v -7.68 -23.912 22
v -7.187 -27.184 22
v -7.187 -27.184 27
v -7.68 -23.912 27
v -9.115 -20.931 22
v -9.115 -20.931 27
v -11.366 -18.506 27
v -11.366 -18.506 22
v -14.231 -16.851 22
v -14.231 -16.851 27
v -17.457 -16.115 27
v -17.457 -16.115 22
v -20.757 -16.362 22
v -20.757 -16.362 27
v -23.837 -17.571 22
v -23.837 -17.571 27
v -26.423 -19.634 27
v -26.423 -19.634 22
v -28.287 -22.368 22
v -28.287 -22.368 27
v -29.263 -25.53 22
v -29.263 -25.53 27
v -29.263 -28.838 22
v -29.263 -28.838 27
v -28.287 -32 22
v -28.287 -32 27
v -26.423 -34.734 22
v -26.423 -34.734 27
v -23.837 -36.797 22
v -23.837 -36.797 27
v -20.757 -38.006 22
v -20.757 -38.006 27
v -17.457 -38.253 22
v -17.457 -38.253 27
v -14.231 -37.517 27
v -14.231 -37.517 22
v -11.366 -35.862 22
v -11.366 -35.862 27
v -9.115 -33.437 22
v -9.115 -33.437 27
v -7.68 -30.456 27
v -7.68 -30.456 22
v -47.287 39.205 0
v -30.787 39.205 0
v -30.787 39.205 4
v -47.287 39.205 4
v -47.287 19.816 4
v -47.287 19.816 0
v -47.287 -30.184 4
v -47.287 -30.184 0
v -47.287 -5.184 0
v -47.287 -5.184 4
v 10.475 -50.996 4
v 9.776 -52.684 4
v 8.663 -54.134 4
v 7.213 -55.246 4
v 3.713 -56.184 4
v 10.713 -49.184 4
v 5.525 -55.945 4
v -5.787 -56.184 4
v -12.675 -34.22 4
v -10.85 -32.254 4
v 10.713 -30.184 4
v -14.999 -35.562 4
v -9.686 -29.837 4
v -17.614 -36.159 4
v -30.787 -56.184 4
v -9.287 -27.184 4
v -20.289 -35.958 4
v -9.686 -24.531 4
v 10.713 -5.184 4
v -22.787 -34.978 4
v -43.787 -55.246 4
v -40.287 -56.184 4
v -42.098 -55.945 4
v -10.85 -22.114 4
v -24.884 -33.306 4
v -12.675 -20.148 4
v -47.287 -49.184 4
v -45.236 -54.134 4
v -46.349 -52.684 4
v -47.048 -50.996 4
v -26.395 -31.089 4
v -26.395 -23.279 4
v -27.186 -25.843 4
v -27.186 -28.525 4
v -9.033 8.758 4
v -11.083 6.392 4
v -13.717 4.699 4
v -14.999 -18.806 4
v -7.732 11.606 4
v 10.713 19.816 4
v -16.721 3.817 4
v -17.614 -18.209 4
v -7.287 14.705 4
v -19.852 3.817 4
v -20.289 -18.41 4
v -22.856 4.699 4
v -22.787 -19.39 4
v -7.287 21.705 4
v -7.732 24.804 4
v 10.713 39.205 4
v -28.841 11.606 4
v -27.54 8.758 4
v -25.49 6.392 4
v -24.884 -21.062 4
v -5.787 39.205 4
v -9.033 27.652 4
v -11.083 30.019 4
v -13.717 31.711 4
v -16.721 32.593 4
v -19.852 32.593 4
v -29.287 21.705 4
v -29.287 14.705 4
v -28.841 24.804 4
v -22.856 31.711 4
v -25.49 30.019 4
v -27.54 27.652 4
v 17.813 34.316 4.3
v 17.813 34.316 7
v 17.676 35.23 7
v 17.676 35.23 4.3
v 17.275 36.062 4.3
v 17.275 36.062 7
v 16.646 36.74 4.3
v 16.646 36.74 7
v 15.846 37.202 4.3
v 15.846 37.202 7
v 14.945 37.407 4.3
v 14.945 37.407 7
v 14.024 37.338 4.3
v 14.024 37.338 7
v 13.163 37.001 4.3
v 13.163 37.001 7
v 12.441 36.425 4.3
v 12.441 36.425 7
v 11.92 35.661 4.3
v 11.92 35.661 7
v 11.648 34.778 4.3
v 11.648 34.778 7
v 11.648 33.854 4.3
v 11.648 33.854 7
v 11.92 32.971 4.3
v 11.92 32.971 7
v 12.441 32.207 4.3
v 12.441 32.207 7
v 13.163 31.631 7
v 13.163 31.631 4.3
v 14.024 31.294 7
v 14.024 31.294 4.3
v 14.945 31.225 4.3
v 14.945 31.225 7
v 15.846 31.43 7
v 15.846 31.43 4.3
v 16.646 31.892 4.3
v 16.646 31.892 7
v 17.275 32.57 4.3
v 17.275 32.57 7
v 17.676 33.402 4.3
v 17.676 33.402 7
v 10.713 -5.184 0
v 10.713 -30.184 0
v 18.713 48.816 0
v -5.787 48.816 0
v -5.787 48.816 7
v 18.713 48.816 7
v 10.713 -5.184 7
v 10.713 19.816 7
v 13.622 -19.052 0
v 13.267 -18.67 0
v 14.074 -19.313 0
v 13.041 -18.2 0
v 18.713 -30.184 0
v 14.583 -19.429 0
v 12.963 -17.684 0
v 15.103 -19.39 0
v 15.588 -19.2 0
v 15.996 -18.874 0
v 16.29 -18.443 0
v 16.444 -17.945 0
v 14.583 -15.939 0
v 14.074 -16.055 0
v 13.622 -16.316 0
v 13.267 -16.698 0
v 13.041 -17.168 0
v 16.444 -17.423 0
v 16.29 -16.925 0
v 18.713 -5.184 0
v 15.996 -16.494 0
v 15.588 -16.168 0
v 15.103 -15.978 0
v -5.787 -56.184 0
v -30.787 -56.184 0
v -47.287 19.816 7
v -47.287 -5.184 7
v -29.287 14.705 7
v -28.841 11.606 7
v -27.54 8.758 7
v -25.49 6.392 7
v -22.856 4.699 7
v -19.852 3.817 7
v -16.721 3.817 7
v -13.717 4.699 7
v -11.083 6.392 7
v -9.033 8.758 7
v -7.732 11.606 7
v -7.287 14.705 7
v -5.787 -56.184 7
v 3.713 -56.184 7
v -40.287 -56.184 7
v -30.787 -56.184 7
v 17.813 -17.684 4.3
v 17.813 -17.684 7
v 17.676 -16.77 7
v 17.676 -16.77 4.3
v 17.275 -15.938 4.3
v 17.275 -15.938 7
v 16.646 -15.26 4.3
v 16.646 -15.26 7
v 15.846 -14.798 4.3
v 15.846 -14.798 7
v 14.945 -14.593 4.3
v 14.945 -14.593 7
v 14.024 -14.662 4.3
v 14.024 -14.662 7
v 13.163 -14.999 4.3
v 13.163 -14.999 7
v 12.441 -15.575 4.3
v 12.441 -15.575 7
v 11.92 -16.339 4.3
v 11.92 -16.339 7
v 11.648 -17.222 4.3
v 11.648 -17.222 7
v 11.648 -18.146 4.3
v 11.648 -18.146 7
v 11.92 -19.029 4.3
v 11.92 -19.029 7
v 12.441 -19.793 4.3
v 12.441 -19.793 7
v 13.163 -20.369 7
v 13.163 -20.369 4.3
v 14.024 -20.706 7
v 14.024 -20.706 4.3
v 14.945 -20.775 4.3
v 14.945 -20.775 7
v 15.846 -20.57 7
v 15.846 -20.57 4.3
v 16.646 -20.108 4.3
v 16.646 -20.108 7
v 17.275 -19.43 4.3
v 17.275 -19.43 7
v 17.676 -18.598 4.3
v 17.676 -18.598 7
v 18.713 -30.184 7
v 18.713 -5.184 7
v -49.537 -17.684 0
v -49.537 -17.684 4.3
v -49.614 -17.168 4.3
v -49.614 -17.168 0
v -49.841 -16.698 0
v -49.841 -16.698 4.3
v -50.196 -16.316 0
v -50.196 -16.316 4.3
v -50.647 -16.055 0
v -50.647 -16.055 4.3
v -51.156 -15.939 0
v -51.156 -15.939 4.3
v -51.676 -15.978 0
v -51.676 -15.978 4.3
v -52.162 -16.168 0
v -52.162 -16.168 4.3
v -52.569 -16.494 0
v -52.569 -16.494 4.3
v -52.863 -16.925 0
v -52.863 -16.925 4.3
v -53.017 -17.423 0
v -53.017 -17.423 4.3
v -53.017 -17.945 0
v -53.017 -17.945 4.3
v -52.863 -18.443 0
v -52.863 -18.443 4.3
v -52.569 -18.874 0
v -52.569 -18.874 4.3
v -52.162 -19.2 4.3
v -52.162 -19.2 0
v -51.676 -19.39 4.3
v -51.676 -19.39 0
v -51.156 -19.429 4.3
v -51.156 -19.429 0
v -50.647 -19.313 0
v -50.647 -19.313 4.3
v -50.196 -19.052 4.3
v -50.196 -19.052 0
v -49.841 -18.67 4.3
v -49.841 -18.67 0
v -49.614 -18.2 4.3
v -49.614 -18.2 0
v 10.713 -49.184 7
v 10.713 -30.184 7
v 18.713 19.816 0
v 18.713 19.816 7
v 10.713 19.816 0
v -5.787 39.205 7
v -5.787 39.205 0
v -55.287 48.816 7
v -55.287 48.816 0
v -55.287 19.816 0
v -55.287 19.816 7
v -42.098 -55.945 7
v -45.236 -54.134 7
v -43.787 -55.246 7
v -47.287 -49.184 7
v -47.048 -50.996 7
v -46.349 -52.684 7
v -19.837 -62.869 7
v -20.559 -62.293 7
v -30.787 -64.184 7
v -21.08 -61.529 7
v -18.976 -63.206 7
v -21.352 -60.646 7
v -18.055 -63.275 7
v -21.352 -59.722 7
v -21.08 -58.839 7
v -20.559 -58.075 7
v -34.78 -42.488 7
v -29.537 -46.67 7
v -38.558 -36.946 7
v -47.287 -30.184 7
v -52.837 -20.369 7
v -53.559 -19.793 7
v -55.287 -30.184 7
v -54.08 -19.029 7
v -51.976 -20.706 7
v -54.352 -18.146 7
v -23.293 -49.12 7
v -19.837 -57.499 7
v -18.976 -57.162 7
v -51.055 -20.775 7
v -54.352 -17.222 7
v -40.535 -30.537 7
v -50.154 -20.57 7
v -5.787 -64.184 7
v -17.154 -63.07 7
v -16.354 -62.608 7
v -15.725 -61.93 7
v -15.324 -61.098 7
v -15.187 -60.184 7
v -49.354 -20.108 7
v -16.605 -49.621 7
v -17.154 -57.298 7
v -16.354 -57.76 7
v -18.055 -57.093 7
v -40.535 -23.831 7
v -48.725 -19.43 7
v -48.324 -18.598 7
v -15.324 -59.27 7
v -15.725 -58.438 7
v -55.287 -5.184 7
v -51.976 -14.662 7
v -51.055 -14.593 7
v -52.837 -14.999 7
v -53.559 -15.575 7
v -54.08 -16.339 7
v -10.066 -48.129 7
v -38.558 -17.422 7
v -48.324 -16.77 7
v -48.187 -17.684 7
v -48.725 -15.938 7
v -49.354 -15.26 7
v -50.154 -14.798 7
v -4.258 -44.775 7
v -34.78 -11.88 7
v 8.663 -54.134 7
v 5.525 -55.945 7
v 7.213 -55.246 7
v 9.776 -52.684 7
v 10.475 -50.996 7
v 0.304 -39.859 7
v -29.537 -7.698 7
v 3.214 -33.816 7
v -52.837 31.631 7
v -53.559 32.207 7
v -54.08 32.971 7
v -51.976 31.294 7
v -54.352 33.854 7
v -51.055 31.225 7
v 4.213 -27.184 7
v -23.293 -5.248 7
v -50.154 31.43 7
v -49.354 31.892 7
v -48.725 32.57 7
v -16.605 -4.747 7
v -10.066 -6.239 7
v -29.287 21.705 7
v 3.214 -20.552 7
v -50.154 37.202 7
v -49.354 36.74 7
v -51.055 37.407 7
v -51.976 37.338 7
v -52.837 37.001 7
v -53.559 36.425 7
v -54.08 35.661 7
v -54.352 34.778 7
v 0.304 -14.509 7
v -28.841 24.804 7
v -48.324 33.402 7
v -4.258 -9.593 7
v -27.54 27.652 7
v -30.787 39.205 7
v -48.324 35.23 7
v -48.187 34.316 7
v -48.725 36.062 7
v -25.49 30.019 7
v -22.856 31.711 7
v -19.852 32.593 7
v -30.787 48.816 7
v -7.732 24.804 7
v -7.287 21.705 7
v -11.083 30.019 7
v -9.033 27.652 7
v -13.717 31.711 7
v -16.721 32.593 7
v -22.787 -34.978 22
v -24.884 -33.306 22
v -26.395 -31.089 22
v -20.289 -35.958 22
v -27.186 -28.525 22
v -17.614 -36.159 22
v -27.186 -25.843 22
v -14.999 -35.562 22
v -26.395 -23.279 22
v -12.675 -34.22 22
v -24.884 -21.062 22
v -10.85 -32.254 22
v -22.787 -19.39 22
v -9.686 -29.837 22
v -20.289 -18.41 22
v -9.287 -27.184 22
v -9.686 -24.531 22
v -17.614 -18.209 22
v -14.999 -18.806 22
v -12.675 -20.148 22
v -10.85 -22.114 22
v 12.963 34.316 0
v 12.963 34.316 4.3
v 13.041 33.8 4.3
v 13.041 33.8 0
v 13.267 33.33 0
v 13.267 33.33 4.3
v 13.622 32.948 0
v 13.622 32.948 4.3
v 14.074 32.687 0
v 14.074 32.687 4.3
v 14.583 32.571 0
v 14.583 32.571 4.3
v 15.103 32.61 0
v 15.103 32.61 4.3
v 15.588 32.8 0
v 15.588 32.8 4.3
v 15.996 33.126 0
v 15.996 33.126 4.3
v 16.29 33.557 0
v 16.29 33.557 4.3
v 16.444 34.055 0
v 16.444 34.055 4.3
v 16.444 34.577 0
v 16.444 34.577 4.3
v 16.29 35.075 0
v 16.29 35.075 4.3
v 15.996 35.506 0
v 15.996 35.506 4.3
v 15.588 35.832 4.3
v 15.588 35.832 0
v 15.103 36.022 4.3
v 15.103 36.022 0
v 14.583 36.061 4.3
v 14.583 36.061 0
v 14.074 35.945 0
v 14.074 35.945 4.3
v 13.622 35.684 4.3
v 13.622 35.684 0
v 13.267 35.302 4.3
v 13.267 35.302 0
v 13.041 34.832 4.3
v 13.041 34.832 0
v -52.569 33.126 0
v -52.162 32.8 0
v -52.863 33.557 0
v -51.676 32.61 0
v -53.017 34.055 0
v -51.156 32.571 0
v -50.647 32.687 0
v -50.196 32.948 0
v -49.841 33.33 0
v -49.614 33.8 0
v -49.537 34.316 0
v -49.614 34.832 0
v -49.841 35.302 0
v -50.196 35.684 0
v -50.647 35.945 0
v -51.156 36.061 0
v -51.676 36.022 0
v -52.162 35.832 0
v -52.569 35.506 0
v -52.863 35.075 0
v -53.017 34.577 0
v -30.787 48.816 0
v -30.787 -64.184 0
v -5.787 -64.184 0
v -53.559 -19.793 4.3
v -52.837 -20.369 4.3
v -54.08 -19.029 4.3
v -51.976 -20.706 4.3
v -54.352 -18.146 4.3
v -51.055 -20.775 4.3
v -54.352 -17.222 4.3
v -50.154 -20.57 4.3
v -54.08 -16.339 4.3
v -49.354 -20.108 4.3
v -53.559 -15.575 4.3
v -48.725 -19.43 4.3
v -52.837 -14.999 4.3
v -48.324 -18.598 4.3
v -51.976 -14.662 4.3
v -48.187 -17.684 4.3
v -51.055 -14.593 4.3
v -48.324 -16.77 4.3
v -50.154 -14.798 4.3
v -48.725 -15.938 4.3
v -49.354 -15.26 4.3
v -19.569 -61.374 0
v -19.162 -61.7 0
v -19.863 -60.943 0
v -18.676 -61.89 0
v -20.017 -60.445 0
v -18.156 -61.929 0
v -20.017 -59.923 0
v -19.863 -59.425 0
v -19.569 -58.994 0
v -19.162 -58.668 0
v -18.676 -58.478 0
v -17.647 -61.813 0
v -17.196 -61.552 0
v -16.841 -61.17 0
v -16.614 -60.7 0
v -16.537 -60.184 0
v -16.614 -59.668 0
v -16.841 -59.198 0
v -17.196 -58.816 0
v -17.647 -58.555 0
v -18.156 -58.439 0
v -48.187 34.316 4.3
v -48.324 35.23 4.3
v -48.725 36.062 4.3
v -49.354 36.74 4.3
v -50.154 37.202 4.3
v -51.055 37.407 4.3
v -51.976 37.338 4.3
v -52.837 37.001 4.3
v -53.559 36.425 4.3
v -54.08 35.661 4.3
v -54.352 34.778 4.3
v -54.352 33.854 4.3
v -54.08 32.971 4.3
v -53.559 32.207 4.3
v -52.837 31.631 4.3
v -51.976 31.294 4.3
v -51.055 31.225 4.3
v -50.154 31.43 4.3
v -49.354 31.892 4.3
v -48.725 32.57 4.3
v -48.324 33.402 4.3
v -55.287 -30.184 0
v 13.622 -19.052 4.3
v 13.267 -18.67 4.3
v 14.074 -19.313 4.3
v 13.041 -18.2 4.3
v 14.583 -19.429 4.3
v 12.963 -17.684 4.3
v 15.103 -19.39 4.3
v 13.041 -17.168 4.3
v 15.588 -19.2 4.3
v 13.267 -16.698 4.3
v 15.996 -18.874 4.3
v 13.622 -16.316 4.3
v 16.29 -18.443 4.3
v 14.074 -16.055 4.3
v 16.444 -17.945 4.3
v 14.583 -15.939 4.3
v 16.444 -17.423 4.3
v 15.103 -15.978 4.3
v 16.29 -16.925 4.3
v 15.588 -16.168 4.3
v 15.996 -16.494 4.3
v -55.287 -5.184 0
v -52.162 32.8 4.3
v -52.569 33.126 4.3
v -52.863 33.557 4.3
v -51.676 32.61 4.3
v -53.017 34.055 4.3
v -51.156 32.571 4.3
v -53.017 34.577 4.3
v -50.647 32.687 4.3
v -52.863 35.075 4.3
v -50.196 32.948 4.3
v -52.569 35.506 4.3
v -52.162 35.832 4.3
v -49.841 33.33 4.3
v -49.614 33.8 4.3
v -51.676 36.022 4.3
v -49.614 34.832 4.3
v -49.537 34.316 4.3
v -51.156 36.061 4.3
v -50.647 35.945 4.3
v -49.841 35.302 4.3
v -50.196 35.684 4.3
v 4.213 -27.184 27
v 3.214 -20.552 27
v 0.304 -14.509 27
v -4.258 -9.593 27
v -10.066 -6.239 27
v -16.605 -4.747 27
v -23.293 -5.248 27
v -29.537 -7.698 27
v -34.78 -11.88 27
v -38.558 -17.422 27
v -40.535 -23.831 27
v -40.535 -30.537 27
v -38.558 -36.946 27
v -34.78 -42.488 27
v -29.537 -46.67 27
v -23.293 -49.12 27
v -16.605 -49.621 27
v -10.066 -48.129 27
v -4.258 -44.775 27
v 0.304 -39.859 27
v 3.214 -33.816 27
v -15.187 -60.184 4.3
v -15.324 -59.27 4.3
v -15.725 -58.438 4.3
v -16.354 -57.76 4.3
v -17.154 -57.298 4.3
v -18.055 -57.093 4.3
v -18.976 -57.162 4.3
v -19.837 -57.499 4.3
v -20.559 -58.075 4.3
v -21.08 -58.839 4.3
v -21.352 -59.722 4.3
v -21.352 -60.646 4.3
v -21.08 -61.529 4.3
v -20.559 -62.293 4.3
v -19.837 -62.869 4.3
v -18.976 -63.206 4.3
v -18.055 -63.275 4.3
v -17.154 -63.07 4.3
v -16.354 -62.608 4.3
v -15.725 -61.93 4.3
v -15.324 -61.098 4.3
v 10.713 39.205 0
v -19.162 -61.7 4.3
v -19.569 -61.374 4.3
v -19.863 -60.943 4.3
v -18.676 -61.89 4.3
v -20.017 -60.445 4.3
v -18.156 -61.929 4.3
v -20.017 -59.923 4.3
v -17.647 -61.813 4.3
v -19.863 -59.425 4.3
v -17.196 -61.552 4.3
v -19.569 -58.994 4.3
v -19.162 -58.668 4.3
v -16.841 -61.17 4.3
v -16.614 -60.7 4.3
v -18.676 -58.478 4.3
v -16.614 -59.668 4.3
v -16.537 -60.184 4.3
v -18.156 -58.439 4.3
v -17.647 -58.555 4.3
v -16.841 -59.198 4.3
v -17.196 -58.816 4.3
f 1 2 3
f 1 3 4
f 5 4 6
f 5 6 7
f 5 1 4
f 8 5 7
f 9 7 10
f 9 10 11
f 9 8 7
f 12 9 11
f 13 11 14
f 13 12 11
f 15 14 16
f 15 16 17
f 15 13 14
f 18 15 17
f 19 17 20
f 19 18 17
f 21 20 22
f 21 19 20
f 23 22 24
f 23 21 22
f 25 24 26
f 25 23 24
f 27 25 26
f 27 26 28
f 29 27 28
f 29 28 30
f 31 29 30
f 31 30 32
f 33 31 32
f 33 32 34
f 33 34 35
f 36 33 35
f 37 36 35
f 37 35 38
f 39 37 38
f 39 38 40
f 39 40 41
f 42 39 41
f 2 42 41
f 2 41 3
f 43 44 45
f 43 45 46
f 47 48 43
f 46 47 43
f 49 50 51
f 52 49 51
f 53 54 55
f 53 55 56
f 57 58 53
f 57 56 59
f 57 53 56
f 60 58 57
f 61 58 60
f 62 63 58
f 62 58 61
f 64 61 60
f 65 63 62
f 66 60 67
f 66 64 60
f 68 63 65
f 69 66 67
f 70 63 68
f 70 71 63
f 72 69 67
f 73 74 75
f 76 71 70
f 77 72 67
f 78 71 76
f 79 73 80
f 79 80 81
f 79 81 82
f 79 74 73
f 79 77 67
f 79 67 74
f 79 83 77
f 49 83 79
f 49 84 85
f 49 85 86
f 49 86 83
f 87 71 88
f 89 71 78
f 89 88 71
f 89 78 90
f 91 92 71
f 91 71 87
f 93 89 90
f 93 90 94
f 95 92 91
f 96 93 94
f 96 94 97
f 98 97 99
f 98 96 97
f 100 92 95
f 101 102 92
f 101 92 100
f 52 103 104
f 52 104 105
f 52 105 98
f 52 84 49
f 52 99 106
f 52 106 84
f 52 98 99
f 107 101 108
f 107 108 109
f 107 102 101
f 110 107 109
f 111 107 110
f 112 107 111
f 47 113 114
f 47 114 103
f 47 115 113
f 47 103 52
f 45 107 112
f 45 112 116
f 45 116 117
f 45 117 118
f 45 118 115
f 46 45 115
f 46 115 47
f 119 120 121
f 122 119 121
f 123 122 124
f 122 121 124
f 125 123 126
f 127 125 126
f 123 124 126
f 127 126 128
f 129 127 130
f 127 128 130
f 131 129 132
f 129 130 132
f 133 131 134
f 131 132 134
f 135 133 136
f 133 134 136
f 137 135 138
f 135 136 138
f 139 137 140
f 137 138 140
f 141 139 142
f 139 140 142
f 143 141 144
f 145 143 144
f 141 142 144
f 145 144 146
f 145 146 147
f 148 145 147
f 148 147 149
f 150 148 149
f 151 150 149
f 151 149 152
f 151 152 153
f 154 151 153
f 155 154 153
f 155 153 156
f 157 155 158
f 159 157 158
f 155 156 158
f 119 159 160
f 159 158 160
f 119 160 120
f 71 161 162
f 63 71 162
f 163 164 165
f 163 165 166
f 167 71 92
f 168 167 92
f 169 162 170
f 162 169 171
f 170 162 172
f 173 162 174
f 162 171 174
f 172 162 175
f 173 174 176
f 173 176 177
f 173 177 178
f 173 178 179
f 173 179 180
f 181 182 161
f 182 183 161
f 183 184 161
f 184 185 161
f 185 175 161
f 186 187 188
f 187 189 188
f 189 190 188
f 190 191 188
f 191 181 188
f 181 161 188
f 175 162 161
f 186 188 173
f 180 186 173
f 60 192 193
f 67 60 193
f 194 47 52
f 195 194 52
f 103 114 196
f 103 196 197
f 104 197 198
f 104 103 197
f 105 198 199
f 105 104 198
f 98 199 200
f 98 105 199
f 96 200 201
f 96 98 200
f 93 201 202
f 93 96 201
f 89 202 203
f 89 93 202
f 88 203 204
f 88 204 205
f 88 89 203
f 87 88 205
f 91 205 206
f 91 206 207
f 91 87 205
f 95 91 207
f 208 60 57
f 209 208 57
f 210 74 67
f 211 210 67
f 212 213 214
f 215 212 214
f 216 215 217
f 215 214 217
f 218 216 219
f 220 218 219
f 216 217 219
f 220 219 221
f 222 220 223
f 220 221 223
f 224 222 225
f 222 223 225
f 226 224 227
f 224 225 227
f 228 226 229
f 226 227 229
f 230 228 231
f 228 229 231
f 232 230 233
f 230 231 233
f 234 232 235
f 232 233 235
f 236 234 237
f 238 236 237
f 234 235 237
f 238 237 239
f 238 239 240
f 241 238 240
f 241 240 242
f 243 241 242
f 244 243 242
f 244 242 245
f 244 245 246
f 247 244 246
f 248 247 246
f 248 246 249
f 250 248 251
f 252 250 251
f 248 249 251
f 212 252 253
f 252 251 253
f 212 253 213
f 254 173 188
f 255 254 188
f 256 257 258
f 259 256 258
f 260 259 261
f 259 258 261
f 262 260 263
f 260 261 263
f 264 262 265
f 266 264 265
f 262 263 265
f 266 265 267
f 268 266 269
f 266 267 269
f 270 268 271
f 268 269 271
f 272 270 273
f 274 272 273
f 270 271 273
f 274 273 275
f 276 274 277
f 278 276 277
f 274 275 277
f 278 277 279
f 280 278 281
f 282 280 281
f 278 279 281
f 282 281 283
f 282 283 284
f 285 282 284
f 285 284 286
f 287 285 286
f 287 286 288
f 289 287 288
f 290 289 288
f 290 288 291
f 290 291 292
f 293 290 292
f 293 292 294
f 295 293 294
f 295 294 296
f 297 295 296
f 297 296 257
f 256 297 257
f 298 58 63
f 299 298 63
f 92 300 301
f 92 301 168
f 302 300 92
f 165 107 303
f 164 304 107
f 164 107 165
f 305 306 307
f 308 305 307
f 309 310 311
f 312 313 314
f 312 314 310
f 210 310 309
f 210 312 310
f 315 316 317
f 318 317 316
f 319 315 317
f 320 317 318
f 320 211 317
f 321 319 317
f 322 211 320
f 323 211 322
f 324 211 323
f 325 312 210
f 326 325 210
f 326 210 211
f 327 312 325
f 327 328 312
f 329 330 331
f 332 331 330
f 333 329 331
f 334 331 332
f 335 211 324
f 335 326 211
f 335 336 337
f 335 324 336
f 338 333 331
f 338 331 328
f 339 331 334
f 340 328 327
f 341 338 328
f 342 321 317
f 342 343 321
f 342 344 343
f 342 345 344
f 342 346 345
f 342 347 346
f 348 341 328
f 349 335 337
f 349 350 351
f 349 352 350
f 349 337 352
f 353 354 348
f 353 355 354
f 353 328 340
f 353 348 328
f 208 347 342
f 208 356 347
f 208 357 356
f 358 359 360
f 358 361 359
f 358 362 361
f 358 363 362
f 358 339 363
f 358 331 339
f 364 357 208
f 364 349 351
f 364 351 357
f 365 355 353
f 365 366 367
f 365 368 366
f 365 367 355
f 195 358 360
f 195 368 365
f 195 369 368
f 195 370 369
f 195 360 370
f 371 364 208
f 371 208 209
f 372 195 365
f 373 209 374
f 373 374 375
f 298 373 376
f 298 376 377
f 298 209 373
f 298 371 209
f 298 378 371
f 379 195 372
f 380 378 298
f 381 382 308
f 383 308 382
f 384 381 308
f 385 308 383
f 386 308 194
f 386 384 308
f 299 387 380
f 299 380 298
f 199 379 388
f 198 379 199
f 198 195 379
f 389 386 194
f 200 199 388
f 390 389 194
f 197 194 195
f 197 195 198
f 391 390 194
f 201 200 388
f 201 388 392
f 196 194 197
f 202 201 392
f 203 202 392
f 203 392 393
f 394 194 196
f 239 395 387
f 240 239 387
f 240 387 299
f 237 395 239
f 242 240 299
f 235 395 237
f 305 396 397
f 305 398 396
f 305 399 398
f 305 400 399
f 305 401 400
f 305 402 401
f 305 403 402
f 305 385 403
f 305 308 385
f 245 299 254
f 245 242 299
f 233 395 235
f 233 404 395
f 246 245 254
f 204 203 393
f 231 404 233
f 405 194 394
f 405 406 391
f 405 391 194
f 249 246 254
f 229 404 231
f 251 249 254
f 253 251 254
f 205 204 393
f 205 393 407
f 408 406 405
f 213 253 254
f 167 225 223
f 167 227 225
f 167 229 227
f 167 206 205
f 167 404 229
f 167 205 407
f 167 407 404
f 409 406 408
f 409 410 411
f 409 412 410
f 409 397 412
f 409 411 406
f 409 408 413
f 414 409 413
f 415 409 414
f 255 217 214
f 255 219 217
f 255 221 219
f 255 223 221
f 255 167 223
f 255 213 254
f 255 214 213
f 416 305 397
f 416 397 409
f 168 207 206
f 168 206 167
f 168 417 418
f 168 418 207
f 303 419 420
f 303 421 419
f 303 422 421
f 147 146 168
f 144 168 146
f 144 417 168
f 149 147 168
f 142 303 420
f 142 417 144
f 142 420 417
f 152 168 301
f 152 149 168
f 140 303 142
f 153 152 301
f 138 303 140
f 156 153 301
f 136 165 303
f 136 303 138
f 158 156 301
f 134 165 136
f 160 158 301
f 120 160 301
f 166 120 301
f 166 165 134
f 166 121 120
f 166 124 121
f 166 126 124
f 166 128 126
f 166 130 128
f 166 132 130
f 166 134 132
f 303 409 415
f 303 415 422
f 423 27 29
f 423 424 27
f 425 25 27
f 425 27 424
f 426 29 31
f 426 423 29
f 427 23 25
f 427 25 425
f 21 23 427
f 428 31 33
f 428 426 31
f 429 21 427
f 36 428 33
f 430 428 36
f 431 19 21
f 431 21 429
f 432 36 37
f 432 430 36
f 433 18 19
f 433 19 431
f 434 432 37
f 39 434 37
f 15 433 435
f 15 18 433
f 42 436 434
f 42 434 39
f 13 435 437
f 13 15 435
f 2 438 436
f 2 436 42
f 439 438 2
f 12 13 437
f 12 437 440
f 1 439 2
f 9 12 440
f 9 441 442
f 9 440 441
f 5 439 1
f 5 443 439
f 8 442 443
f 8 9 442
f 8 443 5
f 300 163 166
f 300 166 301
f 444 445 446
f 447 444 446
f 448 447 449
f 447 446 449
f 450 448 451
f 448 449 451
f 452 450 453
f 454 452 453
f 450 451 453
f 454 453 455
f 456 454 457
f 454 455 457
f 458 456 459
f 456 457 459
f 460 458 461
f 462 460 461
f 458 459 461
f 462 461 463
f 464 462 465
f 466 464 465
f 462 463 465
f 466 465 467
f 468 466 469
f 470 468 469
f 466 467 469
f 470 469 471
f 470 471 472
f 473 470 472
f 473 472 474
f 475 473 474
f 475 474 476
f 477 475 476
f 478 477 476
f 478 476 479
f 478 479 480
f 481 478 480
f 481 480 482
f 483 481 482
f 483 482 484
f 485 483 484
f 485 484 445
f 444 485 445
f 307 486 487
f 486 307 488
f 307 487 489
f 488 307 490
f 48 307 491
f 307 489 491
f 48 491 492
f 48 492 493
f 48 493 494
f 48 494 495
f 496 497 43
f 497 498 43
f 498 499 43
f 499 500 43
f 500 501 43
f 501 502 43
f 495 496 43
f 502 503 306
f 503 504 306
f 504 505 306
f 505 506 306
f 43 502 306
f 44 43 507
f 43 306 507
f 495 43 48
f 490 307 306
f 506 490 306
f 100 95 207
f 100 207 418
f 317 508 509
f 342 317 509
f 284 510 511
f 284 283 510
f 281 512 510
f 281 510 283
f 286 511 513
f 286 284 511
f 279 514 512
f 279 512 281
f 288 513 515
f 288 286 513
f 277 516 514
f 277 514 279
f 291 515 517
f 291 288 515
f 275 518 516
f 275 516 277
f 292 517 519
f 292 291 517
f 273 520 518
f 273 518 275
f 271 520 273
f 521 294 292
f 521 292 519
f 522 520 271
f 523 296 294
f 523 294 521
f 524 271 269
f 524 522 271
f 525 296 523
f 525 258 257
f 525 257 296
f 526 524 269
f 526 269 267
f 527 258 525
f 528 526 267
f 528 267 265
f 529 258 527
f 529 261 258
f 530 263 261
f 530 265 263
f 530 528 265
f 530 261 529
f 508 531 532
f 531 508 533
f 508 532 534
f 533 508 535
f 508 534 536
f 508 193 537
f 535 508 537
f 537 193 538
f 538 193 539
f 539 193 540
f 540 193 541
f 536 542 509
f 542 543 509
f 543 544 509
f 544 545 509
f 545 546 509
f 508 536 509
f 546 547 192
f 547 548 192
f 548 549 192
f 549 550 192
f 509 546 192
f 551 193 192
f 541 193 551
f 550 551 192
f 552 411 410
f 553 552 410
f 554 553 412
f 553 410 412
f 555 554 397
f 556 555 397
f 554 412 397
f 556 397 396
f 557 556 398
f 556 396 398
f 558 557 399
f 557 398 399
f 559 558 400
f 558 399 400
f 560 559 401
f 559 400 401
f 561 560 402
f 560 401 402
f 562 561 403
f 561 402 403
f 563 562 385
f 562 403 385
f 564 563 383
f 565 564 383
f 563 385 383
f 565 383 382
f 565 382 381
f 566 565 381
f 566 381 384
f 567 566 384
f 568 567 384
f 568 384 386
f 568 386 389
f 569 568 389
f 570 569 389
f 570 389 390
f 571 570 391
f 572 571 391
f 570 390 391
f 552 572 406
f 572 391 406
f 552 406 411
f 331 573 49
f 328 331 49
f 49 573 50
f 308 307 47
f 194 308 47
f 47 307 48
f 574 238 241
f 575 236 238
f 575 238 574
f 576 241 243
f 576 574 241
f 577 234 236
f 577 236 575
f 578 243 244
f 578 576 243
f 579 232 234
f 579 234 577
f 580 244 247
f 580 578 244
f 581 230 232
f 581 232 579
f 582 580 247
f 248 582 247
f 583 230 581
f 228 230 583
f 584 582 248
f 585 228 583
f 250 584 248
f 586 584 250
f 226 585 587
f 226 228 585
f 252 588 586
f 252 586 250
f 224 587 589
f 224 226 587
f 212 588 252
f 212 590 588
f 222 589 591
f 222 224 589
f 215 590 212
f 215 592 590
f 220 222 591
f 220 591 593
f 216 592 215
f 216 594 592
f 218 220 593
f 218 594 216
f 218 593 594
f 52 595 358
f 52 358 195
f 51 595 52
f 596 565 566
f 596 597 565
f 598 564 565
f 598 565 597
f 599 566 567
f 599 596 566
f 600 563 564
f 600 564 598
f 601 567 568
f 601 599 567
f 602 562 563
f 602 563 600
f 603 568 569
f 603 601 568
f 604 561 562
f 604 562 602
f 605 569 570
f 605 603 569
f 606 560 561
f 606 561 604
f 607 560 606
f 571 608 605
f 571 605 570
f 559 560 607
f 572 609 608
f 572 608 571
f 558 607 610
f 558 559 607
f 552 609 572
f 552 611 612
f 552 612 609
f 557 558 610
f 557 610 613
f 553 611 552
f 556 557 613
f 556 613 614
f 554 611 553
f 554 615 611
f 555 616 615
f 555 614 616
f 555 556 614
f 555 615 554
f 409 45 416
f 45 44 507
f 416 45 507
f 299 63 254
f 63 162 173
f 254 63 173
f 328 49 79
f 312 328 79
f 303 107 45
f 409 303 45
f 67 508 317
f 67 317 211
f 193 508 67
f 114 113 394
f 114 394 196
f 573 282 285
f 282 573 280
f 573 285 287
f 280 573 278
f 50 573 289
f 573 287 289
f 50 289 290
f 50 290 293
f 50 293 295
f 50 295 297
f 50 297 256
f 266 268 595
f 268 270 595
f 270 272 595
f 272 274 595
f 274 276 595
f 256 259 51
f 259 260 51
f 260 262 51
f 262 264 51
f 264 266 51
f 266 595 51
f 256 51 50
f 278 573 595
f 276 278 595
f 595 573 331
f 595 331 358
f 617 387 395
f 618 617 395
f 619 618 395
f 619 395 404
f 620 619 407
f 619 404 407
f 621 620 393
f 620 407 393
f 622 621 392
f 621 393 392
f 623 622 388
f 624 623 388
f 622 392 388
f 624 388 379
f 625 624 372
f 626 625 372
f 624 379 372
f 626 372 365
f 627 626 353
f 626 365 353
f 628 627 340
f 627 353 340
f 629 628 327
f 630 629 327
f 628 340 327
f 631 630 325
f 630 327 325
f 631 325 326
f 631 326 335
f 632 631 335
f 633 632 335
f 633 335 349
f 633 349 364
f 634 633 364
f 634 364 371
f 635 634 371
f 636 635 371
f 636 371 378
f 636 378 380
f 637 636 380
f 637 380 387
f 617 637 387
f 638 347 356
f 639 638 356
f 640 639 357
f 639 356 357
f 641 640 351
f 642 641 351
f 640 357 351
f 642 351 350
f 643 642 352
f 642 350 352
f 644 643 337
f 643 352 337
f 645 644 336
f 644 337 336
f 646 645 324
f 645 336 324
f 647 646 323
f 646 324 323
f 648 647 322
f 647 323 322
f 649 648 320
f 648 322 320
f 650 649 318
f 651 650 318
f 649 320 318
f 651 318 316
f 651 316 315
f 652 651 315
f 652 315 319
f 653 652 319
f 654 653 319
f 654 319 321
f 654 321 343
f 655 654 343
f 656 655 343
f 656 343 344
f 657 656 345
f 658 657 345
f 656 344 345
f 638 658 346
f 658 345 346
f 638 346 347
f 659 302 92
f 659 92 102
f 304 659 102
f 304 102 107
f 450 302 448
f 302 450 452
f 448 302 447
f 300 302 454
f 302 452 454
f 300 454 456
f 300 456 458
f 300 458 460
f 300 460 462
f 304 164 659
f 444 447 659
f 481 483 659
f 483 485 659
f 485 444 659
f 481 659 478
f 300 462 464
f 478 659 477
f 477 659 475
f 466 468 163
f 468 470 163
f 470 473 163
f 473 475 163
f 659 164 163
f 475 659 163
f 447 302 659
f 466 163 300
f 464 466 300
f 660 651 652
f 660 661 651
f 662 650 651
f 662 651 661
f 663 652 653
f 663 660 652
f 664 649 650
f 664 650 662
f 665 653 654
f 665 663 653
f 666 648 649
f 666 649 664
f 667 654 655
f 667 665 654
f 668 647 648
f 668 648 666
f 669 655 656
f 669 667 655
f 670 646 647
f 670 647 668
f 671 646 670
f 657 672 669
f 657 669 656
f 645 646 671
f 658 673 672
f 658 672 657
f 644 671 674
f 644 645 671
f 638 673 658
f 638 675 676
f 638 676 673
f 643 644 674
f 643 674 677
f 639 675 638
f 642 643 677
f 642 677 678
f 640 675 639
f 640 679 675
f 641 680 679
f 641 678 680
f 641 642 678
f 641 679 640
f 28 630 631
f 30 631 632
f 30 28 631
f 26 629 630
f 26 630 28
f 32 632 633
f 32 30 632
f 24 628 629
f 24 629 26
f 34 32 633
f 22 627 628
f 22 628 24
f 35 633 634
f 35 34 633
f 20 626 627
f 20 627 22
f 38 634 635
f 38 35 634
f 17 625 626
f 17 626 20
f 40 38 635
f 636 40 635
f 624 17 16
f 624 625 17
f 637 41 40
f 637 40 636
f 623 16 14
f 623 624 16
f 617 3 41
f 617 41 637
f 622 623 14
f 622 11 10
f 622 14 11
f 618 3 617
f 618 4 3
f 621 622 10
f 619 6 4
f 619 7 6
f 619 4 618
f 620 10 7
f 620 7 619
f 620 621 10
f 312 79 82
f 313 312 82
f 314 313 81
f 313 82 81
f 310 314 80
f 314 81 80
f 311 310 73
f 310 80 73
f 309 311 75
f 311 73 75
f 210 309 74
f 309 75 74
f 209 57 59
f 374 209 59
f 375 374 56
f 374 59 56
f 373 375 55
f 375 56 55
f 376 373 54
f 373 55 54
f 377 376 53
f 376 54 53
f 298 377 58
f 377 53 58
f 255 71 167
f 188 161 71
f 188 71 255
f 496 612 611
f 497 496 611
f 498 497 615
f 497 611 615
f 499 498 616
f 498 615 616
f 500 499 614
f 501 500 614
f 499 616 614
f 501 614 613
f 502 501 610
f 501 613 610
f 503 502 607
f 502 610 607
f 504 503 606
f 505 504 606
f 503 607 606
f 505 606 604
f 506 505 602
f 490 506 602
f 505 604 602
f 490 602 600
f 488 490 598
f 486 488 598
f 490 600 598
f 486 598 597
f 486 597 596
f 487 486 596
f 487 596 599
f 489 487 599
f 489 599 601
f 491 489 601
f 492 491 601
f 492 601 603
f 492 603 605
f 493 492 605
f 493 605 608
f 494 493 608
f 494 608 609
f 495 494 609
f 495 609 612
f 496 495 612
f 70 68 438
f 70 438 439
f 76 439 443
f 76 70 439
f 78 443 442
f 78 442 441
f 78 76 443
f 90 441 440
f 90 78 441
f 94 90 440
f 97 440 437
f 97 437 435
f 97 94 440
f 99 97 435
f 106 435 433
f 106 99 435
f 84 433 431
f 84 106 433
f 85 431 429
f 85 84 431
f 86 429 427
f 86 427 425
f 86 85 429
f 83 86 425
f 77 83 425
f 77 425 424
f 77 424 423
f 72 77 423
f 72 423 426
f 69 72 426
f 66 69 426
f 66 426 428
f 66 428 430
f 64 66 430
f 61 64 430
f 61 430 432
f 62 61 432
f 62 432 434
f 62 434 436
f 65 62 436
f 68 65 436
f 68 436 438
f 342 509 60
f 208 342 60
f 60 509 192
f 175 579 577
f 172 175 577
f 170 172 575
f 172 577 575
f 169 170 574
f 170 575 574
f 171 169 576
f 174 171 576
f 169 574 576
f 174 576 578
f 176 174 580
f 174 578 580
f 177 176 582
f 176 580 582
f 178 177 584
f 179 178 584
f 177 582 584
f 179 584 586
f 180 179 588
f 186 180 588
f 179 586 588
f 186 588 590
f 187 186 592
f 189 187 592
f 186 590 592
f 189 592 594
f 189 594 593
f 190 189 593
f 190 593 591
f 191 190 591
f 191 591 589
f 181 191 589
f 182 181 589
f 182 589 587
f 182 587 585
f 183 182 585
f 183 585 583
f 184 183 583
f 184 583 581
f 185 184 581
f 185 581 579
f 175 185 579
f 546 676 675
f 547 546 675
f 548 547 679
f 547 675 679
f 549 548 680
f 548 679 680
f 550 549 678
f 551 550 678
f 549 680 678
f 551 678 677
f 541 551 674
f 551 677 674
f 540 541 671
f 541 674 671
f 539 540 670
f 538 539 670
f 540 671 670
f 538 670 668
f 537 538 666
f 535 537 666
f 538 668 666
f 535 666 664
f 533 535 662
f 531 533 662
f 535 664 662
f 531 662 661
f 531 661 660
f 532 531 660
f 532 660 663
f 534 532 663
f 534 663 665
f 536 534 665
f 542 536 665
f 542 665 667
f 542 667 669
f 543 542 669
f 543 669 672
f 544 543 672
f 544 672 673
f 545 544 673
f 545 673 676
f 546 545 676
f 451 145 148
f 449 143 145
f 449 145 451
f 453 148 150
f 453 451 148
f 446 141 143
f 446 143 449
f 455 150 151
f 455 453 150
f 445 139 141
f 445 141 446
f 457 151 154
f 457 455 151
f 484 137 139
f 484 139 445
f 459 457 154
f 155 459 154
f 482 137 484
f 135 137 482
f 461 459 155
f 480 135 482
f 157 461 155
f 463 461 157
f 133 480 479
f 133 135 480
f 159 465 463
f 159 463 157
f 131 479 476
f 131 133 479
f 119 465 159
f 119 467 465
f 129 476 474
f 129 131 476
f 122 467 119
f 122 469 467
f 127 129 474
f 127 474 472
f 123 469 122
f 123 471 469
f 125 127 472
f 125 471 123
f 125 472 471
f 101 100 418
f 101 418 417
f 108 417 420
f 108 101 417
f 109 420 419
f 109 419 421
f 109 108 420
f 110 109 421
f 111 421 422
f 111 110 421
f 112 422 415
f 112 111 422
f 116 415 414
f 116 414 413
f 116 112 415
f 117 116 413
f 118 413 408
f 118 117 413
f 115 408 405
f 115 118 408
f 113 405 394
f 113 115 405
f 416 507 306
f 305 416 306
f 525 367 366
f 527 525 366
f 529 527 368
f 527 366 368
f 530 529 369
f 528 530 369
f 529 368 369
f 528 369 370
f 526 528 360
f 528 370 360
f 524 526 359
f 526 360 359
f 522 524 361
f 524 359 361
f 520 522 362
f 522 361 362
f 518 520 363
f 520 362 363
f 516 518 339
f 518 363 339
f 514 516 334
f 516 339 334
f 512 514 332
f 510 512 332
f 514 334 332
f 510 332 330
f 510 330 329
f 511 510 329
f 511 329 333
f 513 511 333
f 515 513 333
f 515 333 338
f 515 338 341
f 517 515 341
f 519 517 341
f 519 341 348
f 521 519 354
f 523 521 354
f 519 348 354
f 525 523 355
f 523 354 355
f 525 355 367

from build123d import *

# Parameters (mm, degrees)
CROQUIS2_R              = 22.5
SALIENTE_EXTRUIR1_DEPTH = 7
CROQUIS2_4_R            = 11.1
CROQUIS2_4_R_2          = 9
SALIENTE_EXTRUIR2_DEPTH = 22
CROQUIS2_5_R            = 22.5
CROQUIS2_5_R_2          = 11.1
SALIENTE_EXTRUIR3_DEPTH = 27
CROQUIS3_R              = 1.75
CORTAR_EXTRUIR1_DEPTH   = 7
CROQUIS4_R              = 3.1
CORTAR_EXTRUIR2_DEPTH   = 2.7
CROQUIS5_R              = 9
CORTAR_EXTRUIR3_DEPTH   = 4


with BuildPart() as part:
    # Croquis2 → Saliente-Extruir1 (new body)
    with BuildSketch(Plane.XY):
        with BuildLine():
            Line((-30.786620614, 39.205288522), (-30.786620614, 48.816010109))
            Line((-30.786620614, 48.816010109), (-55.286620614, 48.816010109))
            Line((-55.286620614, 48.816010109), (-55.286620614, 19.816010109))
            Line((-55.286620614, 19.816010109), (-47.286620614, 19.816010109))
            Line((-47.286620614, 19.816010109), (-47.286620614, -5.183989891))
            Line((-47.286620614, -5.183989891), (-55.286620614, -5.183989891))
            Line((-55.286620614, -5.183989891), (-55.286620614, -30.183989891))
            Line((-55.286620614, -30.183989891), (-47.286620614, -30.183989891))
            Line((-47.286620614, -30.183989891), (-47.286620614, -49.183989891))
            ThreePointArc((-47.286620614, -49.183989891), (-45.236368082, -54.133737359), (-40.286620614, -56.183989891))
            Line((-40.286620614, -56.183989891), (-30.786620614, -56.183989891))
            Line((-30.786620614, -56.183989891), (-30.786620614, -64.183989891))
            Line((-30.786620614, -64.183989891), (-5.786620614, -64.183989891))
            Line((-5.786620614, -64.183989891), (-5.786620614, -56.183989891))
            Line((-5.786620614, -56.183989891), (3.713379386, -56.183989891))
            ThreePointArc((3.713379386, -56.183989891), (8.663126854, -54.133737359), (10.713379386, -49.183989891))
            Line((10.713379386, -49.183989891), (10.713379386, -30.183989891))
            Line((10.713379386, -30.183989891), (18.713379386, -30.183989891))
            Line((18.713379386, -30.183989891), (18.713379386, -5.183989891))
            Line((18.713379386, -5.183989891), (10.713379386, -5.183989891))
            Line((10.713379386, -5.183989891), (10.713379386, 19.816010109))
            Line((10.713379386, 19.816010109), (18.713379386, 19.816010109))
            Line((18.713379386, 19.816010109), (18.713379386, 48.816010109))
            Line((18.713379386, 48.816010109), (-5.786620614, 48.816010109))
            Line((-5.786620614, 48.816010109), (-5.786620614, 39.205288522))
            Line((-5.786620614, 39.205288522), (-30.786620614, 39.205288522))
        make_face()
        with BuildLine():
            ThreePointArc((-7.286620614, 14.705288522), (-18.286620614, 3.705288522), (-29.286620614, 14.705288522))
            Line((-29.286620614, 14.705288522), (-29.286620614, 21.705288522))
            ThreePointArc((-29.286620614, 21.705288522), (-18.286620614, 32.705288522), (-7.286620614, 21.705288522))
            Line((-7.286620614, 21.705288522), (-7.286620614, 14.705288522))
        make_face(mode=Mode.SUBTRACT)
        with Locations((-18.286620614, -27.183989891)):
            Circle(CROQUIS2_R, mode=Mode.SUBTRACT)
    extrude(amount=SALIENTE_EXTRUIR1_DEPTH)



with BuildPart() as body_2:
    # Croquis2<4> → Saliente-Extruir2 (new body)
    with BuildSketch(Plane.XY):
        with Locations((-18.286620614, -27.183989891)):
            Circle(CROQUIS2_4_R)
        with Locations((-18.286620614, -27.183989891)):
            Circle(CROQUIS2_4_R_2, mode=Mode.SUBTRACT)
    extrude(amount=SALIENTE_EXTRUIR2_DEPTH)


with BuildPart() as part_1:
    add(part.part)

    add(body_2.part)  # Saliente-Extruir3 merges body 2
    # Croquis2<5> → Saliente-Extruir3 (add)
    with BuildSketch(Plane.XY):
        with Locations((-18.286620614, -27.183989891)):
            Circle(CROQUIS2_5_R)
        with Locations((-18.286620614, -27.183989891)):
            Circle(CROQUIS2_5_R_2, mode=Mode.SUBTRACT)
    extrude(amount=SALIENTE_EXTRUIR3_DEPTH)

    # Croquis3 → Cortar-Extruir1 (cut)
    with BuildSketch(Plane.XY.offset(7)):
        with Locations((-51.286620614, 34.316010109)):
            Circle(CROQUIS3_R)
        with Locations((-51.286620614, -17.683989891)):
            Circle(CROQUIS3_R)
        with Locations((-18.286620614, -60.183989891)):
            Circle(CROQUIS3_R)
        with Locations((14.713379386, -17.683989891)):
            Circle(CROQUIS3_R)
        with Locations((14.713379386, 34.316010109)):
            Circle(CROQUIS3_R)
    extrude(amount=-CORTAR_EXTRUIR1_DEPTH, mode=Mode.SUBTRACT)

    # Croquis4 → Cortar-Extruir2 (cut)
    with BuildSketch(Plane.XY.offset(7)):
        with Locations((-51.286620614, -17.683989891)):
            Circle(CROQUIS4_R)
        with Locations((-51.286620614, 34.316010109)):
            Circle(CROQUIS4_R)
        with Locations((14.713379386, 34.316010109)):
            Circle(CROQUIS4_R)
        with Locations((14.713379386, -17.683989891)):
            Circle(CROQUIS4_R)
        with Locations((-18.286620614, -60.183989891)):
            Circle(CROQUIS4_R)
    extrude(amount=-CORTAR_EXTRUIR2_DEPTH, mode=Mode.SUBTRACT)

    # Croquis5 → Cortar-Extruir3 (cut)
    with BuildSketch(Plane(origin=(0, 0, 0), x_dir=(-1, 0, 0), z_dir=(0, 0, -1))):
        with BuildLine():
            Line((47.286620614, 39.205288522), (-10.713379386, 39.205288522))
            Line((-10.713379386, 39.205288522), (-10.713379386, -49.183989891))
            ThreePointArc((-10.713379386, -49.183989891), (-8.663126854, -54.133737359), (-3.713379386, -56.183989891))
            Line((-3.713379386, -56.183989891), (40.286620614, -56.183989891))
            ThreePointArc((40.286620614, -56.183989891), (45.236368082, -54.133737359), (47.286620614, -49.183989891))
            Line((47.286620614, -49.183989891), (47.286620614, 39.205288522))
        make_face()
        with BuildLine():
            Line((7.286620614, 14.705288522), (7.286620614, 21.705288522))
            ThreePointArc((7.286620614, 21.705288522), (18.286620614, 32.705288522), (29.286620614, 21.705288522))
            Line((29.286620614, 21.705288522), (29.286620614, 14.705288522))
            ThreePointArc((29.286620614, 14.705288522), (18.286620614, 3.705288522), (7.286620614, 14.705288522))
        make_face(mode=Mode.SUBTRACT)
        with Locations((18.286620614, -27.183989891)):
            Circle(CROQUIS5_R, mode=Mode.SUBTRACT)
    extrude(amount=-CORTAR_EXTRUIR3_DEPTH, mode=Mode.SUBTRACT)


solid = part_1.part
